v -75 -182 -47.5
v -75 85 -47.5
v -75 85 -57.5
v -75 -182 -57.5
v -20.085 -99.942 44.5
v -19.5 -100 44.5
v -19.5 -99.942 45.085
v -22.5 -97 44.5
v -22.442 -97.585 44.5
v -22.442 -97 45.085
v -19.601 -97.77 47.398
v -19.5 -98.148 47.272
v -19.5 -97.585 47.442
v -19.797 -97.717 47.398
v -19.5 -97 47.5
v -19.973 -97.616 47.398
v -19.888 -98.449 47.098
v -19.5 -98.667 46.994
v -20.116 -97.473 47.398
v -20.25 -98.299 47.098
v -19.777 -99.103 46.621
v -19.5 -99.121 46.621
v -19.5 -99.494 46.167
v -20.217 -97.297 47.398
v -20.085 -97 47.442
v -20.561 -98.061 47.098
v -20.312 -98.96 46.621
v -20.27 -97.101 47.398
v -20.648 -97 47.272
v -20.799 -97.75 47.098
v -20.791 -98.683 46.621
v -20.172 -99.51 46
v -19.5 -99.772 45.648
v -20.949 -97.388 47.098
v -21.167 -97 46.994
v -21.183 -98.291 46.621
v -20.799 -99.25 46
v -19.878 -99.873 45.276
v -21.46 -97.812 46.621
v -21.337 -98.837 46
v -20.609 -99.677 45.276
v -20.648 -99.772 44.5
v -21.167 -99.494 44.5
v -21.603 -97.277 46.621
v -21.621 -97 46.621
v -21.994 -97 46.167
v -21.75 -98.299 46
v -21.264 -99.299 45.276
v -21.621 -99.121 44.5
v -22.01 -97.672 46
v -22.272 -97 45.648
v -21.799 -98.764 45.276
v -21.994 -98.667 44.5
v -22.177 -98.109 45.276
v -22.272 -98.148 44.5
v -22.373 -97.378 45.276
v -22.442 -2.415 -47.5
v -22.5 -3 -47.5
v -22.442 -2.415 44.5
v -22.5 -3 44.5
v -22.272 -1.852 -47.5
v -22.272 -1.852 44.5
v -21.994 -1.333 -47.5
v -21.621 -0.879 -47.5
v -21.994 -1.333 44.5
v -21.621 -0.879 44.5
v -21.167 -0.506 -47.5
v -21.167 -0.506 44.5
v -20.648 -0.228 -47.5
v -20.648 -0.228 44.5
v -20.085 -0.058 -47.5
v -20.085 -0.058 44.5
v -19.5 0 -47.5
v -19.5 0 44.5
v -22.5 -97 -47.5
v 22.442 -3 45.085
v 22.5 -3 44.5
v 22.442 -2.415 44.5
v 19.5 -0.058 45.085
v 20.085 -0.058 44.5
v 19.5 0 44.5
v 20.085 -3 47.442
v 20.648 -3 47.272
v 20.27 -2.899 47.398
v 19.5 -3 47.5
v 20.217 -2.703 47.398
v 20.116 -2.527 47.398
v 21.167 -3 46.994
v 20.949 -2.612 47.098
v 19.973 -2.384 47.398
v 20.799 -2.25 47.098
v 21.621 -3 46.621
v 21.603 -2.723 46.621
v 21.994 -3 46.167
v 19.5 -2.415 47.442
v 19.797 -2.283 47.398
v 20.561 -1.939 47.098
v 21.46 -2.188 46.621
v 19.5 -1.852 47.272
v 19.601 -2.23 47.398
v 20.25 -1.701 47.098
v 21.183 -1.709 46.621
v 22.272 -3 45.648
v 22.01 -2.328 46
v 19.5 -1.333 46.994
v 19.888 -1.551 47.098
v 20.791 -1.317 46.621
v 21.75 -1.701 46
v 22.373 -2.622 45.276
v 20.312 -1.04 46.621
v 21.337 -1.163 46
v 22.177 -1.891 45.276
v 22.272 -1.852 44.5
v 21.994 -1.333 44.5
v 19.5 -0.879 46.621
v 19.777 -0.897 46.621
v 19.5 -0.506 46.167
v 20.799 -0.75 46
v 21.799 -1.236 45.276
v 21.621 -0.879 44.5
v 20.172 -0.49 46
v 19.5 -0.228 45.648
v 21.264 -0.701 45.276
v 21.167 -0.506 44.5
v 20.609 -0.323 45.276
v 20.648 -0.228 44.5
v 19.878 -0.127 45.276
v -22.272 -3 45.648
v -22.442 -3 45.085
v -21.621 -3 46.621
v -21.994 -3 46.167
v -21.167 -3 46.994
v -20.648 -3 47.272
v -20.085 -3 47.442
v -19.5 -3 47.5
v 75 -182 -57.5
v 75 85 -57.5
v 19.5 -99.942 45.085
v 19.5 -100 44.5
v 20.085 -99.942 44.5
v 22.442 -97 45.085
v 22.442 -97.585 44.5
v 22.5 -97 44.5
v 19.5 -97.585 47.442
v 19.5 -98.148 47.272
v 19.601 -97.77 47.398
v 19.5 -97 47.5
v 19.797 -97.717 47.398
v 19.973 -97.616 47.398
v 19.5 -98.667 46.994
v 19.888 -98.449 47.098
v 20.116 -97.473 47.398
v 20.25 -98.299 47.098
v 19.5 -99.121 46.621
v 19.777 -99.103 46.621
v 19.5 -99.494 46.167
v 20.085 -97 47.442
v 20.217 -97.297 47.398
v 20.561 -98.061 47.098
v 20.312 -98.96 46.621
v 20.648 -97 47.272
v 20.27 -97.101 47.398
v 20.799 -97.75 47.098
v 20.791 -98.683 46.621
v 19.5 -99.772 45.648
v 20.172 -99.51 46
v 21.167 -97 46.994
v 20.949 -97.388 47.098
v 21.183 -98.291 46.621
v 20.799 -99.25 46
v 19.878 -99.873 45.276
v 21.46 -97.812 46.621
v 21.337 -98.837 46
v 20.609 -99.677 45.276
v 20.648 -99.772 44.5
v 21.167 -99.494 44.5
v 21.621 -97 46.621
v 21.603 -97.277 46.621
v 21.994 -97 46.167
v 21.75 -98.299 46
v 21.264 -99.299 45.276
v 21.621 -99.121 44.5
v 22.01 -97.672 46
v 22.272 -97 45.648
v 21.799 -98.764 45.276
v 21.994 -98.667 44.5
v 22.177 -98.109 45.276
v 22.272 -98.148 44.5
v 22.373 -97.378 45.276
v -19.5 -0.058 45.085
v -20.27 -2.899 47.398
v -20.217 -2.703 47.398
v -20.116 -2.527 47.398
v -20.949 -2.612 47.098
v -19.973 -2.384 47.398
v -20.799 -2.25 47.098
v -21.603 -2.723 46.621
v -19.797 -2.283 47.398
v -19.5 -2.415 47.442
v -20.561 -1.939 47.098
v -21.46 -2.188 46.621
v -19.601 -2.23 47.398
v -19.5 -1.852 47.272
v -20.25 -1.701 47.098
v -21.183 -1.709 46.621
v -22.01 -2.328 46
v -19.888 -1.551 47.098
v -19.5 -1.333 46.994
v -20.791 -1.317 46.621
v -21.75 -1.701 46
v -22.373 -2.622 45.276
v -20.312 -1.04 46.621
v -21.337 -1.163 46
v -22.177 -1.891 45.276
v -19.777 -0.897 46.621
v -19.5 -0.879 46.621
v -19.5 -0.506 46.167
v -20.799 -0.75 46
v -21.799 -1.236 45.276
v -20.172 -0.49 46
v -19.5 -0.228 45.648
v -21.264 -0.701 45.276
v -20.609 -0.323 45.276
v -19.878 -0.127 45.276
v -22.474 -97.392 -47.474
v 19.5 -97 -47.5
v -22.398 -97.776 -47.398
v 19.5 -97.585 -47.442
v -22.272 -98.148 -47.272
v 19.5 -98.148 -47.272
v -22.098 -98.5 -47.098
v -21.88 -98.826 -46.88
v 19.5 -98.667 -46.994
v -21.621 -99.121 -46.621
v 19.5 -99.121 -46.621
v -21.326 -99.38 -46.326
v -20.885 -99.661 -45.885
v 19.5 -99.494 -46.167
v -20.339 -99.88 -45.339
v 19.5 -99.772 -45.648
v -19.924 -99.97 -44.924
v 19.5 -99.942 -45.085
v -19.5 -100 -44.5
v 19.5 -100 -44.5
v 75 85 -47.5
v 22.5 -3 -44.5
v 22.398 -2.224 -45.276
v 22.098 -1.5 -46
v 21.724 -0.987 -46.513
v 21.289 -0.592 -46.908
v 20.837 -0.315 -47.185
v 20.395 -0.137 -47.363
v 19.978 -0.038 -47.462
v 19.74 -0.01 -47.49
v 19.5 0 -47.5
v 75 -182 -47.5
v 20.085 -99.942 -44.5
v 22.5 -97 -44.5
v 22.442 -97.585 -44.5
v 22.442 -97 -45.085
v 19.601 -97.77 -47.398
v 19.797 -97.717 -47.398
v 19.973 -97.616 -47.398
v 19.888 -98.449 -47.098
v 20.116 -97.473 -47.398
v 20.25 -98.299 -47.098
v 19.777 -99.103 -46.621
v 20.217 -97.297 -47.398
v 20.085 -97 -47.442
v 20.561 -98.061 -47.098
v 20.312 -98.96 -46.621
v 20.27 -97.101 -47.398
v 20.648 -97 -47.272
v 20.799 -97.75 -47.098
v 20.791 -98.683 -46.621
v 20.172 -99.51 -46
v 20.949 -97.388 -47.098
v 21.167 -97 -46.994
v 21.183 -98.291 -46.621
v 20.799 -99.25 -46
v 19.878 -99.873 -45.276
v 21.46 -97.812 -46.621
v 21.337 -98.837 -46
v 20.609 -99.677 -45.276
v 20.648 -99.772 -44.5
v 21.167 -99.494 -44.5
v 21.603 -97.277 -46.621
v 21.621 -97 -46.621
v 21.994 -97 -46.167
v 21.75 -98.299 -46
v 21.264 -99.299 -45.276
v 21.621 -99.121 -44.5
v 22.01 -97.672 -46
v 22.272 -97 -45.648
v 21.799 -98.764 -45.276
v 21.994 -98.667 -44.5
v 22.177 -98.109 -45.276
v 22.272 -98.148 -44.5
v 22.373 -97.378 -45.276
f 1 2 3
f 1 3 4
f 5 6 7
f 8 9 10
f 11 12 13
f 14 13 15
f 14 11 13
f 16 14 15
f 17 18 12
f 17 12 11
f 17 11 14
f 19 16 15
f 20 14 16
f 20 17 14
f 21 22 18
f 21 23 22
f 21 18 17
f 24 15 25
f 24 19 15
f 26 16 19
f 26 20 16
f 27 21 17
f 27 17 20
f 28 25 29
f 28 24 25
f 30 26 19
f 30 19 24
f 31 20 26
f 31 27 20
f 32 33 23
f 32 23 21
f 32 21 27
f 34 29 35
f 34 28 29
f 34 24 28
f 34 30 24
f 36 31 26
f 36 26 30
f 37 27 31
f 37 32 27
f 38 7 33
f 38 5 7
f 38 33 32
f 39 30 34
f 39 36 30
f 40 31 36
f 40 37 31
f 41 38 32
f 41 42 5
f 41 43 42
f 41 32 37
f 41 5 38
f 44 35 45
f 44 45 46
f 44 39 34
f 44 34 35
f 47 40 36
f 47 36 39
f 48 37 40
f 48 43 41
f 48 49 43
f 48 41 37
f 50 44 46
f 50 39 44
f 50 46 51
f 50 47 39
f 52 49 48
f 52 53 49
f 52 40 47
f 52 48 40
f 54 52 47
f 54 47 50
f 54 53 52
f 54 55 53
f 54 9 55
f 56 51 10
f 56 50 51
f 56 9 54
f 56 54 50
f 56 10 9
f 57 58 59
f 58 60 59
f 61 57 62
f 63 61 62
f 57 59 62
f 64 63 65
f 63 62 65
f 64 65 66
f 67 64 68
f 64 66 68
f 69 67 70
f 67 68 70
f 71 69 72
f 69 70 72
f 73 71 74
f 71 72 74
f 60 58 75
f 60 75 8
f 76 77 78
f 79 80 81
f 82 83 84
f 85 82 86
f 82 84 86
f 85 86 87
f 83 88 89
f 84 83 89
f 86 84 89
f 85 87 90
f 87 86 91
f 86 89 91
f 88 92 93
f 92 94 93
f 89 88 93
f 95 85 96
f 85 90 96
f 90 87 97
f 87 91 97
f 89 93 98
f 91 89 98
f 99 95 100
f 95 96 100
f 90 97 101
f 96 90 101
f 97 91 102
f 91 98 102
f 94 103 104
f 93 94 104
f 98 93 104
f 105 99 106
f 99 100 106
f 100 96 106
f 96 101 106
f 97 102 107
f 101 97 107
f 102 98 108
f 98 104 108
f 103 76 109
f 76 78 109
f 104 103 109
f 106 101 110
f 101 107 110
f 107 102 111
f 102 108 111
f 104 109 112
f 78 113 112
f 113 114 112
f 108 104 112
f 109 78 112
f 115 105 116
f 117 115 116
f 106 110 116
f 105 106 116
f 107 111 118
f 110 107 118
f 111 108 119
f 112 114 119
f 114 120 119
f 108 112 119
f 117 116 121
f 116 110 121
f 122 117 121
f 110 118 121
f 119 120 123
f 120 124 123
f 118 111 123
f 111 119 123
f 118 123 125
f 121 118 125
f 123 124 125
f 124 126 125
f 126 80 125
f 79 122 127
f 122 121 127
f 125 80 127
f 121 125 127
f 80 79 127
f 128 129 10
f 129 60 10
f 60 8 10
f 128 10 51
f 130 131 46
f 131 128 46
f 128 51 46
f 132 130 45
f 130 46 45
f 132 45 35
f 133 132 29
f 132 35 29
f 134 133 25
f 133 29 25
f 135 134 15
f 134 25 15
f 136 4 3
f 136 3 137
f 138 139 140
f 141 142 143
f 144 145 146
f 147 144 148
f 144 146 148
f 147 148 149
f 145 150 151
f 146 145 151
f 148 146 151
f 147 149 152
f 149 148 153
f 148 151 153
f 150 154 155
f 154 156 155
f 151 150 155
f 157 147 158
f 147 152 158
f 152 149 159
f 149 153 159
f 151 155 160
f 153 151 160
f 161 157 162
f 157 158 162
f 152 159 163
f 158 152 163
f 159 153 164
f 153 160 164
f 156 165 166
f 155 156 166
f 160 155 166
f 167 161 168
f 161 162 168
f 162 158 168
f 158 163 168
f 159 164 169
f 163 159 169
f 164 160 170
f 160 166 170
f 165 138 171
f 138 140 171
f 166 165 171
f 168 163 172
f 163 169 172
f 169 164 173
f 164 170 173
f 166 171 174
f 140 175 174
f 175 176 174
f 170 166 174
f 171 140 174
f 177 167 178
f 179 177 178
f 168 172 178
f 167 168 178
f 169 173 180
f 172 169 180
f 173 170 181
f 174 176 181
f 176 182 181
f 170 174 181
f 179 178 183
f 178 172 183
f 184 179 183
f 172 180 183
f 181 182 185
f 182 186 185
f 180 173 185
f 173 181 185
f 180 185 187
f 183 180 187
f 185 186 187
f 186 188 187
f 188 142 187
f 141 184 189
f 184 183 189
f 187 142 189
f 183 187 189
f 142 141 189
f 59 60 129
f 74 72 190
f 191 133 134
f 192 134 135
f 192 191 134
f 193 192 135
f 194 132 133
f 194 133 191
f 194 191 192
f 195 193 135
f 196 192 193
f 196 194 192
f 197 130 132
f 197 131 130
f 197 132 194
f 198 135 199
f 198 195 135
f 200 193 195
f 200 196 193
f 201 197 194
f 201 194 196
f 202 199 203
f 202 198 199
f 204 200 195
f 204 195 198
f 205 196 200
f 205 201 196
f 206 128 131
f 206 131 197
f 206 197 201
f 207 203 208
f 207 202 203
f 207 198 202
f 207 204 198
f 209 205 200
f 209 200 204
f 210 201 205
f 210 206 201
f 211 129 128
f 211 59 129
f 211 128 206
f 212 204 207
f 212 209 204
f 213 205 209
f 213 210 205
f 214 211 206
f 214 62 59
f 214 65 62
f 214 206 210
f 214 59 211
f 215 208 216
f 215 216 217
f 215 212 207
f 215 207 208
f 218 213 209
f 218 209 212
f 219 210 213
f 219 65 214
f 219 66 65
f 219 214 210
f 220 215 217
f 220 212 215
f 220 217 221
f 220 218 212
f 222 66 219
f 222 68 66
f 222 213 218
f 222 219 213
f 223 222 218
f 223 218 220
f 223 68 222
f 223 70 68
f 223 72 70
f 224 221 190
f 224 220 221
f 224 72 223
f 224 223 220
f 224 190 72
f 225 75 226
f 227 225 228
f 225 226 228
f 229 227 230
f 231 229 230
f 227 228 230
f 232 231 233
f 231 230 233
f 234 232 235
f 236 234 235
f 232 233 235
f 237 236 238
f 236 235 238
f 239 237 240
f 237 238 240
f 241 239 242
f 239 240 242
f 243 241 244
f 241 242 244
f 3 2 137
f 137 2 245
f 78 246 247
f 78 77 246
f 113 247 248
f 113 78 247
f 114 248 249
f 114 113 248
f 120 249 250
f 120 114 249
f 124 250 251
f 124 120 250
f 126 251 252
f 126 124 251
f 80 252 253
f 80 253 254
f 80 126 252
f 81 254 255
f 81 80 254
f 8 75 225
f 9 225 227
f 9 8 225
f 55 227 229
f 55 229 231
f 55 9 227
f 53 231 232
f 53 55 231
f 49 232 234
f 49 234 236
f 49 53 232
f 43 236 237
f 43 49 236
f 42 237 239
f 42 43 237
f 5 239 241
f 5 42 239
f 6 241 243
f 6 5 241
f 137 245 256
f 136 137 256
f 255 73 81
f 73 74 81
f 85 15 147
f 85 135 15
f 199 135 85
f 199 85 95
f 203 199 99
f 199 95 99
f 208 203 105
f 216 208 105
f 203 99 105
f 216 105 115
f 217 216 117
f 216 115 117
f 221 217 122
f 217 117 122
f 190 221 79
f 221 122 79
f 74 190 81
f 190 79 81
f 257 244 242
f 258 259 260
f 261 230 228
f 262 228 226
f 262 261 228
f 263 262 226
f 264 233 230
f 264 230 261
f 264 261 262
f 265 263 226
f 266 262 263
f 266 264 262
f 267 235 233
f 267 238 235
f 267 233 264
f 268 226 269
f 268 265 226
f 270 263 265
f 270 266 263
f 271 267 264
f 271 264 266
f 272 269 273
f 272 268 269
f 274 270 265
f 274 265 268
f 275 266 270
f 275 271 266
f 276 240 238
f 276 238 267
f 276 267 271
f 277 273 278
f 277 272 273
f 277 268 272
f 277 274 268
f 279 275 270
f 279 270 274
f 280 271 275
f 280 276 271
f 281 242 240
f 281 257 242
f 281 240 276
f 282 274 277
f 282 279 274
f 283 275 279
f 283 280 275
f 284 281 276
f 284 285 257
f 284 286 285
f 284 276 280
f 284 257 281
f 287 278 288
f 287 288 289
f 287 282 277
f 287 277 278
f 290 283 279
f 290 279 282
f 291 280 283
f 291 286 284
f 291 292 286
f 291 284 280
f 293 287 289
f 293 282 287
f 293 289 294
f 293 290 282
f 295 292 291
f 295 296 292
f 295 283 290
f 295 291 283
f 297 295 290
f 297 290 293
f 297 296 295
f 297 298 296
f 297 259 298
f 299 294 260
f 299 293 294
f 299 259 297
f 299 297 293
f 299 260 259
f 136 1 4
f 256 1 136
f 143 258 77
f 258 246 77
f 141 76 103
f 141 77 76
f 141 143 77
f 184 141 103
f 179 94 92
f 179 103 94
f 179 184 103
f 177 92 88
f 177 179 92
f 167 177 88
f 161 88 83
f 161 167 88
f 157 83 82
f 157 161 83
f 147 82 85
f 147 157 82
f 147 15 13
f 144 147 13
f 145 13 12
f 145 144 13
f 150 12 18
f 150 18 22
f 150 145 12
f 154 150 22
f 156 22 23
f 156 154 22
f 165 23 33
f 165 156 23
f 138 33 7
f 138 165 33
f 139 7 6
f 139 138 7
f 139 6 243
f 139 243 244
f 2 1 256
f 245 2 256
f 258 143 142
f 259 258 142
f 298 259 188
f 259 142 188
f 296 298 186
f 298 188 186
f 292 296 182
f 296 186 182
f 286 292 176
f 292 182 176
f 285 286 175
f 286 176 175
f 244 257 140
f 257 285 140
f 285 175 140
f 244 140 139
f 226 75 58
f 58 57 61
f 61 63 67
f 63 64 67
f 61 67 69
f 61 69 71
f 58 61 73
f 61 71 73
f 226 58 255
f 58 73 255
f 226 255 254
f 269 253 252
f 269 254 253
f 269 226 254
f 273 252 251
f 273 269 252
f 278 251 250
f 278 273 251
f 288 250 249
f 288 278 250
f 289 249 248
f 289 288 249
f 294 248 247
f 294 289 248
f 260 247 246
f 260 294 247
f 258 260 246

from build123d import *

# Parameters (mm, degrees)
F0_W     = 45
F0_H     = 95
F1_DEPTH = 100
F2_R     = 3
F3_W     = 150
F3_H     = 267
F4_DEPTH = 10


with BuildPart() as f1:
    # F0 (on Front) → F1 (new body)
    with BuildSketch(Plane.XZ):
        Rectangle(F0_W, F0_H)
    extrude(amount=F1_DEPTH)

    # F2
    f2_edges = [f1.edges().sort_by_distance(p)[0] for p in [
        (22.5, -100, 0),
        (-22.5, -100, 0),
        (0, -100, -47.5),
        (0, -100, 47.5),
        (22.5, 0, 0),
        (-22.5, 0, 0),
        (22.5, -50, -47.5),
        (22.5, -50, 47.5),
        (-22.5, -50, 47.5),
        (0, 0, 47.5),
    ]]
    fillet(f2_edges, radius=F2_R)


with BuildPart() as f4:
    # F3 (on face) → F4 (new body)
    with BuildSketch(Plane(origin=(0, 0, -47.5), x_dir=(1, 0, 0), z_dir=(0, 0, -1))):
        with Locations((0, 48.5)):
            Rectangle(F3_W, F3_H)
    extrude(amount=F4_DEPTH)


solid = Compound([f1.part, f4.part])
